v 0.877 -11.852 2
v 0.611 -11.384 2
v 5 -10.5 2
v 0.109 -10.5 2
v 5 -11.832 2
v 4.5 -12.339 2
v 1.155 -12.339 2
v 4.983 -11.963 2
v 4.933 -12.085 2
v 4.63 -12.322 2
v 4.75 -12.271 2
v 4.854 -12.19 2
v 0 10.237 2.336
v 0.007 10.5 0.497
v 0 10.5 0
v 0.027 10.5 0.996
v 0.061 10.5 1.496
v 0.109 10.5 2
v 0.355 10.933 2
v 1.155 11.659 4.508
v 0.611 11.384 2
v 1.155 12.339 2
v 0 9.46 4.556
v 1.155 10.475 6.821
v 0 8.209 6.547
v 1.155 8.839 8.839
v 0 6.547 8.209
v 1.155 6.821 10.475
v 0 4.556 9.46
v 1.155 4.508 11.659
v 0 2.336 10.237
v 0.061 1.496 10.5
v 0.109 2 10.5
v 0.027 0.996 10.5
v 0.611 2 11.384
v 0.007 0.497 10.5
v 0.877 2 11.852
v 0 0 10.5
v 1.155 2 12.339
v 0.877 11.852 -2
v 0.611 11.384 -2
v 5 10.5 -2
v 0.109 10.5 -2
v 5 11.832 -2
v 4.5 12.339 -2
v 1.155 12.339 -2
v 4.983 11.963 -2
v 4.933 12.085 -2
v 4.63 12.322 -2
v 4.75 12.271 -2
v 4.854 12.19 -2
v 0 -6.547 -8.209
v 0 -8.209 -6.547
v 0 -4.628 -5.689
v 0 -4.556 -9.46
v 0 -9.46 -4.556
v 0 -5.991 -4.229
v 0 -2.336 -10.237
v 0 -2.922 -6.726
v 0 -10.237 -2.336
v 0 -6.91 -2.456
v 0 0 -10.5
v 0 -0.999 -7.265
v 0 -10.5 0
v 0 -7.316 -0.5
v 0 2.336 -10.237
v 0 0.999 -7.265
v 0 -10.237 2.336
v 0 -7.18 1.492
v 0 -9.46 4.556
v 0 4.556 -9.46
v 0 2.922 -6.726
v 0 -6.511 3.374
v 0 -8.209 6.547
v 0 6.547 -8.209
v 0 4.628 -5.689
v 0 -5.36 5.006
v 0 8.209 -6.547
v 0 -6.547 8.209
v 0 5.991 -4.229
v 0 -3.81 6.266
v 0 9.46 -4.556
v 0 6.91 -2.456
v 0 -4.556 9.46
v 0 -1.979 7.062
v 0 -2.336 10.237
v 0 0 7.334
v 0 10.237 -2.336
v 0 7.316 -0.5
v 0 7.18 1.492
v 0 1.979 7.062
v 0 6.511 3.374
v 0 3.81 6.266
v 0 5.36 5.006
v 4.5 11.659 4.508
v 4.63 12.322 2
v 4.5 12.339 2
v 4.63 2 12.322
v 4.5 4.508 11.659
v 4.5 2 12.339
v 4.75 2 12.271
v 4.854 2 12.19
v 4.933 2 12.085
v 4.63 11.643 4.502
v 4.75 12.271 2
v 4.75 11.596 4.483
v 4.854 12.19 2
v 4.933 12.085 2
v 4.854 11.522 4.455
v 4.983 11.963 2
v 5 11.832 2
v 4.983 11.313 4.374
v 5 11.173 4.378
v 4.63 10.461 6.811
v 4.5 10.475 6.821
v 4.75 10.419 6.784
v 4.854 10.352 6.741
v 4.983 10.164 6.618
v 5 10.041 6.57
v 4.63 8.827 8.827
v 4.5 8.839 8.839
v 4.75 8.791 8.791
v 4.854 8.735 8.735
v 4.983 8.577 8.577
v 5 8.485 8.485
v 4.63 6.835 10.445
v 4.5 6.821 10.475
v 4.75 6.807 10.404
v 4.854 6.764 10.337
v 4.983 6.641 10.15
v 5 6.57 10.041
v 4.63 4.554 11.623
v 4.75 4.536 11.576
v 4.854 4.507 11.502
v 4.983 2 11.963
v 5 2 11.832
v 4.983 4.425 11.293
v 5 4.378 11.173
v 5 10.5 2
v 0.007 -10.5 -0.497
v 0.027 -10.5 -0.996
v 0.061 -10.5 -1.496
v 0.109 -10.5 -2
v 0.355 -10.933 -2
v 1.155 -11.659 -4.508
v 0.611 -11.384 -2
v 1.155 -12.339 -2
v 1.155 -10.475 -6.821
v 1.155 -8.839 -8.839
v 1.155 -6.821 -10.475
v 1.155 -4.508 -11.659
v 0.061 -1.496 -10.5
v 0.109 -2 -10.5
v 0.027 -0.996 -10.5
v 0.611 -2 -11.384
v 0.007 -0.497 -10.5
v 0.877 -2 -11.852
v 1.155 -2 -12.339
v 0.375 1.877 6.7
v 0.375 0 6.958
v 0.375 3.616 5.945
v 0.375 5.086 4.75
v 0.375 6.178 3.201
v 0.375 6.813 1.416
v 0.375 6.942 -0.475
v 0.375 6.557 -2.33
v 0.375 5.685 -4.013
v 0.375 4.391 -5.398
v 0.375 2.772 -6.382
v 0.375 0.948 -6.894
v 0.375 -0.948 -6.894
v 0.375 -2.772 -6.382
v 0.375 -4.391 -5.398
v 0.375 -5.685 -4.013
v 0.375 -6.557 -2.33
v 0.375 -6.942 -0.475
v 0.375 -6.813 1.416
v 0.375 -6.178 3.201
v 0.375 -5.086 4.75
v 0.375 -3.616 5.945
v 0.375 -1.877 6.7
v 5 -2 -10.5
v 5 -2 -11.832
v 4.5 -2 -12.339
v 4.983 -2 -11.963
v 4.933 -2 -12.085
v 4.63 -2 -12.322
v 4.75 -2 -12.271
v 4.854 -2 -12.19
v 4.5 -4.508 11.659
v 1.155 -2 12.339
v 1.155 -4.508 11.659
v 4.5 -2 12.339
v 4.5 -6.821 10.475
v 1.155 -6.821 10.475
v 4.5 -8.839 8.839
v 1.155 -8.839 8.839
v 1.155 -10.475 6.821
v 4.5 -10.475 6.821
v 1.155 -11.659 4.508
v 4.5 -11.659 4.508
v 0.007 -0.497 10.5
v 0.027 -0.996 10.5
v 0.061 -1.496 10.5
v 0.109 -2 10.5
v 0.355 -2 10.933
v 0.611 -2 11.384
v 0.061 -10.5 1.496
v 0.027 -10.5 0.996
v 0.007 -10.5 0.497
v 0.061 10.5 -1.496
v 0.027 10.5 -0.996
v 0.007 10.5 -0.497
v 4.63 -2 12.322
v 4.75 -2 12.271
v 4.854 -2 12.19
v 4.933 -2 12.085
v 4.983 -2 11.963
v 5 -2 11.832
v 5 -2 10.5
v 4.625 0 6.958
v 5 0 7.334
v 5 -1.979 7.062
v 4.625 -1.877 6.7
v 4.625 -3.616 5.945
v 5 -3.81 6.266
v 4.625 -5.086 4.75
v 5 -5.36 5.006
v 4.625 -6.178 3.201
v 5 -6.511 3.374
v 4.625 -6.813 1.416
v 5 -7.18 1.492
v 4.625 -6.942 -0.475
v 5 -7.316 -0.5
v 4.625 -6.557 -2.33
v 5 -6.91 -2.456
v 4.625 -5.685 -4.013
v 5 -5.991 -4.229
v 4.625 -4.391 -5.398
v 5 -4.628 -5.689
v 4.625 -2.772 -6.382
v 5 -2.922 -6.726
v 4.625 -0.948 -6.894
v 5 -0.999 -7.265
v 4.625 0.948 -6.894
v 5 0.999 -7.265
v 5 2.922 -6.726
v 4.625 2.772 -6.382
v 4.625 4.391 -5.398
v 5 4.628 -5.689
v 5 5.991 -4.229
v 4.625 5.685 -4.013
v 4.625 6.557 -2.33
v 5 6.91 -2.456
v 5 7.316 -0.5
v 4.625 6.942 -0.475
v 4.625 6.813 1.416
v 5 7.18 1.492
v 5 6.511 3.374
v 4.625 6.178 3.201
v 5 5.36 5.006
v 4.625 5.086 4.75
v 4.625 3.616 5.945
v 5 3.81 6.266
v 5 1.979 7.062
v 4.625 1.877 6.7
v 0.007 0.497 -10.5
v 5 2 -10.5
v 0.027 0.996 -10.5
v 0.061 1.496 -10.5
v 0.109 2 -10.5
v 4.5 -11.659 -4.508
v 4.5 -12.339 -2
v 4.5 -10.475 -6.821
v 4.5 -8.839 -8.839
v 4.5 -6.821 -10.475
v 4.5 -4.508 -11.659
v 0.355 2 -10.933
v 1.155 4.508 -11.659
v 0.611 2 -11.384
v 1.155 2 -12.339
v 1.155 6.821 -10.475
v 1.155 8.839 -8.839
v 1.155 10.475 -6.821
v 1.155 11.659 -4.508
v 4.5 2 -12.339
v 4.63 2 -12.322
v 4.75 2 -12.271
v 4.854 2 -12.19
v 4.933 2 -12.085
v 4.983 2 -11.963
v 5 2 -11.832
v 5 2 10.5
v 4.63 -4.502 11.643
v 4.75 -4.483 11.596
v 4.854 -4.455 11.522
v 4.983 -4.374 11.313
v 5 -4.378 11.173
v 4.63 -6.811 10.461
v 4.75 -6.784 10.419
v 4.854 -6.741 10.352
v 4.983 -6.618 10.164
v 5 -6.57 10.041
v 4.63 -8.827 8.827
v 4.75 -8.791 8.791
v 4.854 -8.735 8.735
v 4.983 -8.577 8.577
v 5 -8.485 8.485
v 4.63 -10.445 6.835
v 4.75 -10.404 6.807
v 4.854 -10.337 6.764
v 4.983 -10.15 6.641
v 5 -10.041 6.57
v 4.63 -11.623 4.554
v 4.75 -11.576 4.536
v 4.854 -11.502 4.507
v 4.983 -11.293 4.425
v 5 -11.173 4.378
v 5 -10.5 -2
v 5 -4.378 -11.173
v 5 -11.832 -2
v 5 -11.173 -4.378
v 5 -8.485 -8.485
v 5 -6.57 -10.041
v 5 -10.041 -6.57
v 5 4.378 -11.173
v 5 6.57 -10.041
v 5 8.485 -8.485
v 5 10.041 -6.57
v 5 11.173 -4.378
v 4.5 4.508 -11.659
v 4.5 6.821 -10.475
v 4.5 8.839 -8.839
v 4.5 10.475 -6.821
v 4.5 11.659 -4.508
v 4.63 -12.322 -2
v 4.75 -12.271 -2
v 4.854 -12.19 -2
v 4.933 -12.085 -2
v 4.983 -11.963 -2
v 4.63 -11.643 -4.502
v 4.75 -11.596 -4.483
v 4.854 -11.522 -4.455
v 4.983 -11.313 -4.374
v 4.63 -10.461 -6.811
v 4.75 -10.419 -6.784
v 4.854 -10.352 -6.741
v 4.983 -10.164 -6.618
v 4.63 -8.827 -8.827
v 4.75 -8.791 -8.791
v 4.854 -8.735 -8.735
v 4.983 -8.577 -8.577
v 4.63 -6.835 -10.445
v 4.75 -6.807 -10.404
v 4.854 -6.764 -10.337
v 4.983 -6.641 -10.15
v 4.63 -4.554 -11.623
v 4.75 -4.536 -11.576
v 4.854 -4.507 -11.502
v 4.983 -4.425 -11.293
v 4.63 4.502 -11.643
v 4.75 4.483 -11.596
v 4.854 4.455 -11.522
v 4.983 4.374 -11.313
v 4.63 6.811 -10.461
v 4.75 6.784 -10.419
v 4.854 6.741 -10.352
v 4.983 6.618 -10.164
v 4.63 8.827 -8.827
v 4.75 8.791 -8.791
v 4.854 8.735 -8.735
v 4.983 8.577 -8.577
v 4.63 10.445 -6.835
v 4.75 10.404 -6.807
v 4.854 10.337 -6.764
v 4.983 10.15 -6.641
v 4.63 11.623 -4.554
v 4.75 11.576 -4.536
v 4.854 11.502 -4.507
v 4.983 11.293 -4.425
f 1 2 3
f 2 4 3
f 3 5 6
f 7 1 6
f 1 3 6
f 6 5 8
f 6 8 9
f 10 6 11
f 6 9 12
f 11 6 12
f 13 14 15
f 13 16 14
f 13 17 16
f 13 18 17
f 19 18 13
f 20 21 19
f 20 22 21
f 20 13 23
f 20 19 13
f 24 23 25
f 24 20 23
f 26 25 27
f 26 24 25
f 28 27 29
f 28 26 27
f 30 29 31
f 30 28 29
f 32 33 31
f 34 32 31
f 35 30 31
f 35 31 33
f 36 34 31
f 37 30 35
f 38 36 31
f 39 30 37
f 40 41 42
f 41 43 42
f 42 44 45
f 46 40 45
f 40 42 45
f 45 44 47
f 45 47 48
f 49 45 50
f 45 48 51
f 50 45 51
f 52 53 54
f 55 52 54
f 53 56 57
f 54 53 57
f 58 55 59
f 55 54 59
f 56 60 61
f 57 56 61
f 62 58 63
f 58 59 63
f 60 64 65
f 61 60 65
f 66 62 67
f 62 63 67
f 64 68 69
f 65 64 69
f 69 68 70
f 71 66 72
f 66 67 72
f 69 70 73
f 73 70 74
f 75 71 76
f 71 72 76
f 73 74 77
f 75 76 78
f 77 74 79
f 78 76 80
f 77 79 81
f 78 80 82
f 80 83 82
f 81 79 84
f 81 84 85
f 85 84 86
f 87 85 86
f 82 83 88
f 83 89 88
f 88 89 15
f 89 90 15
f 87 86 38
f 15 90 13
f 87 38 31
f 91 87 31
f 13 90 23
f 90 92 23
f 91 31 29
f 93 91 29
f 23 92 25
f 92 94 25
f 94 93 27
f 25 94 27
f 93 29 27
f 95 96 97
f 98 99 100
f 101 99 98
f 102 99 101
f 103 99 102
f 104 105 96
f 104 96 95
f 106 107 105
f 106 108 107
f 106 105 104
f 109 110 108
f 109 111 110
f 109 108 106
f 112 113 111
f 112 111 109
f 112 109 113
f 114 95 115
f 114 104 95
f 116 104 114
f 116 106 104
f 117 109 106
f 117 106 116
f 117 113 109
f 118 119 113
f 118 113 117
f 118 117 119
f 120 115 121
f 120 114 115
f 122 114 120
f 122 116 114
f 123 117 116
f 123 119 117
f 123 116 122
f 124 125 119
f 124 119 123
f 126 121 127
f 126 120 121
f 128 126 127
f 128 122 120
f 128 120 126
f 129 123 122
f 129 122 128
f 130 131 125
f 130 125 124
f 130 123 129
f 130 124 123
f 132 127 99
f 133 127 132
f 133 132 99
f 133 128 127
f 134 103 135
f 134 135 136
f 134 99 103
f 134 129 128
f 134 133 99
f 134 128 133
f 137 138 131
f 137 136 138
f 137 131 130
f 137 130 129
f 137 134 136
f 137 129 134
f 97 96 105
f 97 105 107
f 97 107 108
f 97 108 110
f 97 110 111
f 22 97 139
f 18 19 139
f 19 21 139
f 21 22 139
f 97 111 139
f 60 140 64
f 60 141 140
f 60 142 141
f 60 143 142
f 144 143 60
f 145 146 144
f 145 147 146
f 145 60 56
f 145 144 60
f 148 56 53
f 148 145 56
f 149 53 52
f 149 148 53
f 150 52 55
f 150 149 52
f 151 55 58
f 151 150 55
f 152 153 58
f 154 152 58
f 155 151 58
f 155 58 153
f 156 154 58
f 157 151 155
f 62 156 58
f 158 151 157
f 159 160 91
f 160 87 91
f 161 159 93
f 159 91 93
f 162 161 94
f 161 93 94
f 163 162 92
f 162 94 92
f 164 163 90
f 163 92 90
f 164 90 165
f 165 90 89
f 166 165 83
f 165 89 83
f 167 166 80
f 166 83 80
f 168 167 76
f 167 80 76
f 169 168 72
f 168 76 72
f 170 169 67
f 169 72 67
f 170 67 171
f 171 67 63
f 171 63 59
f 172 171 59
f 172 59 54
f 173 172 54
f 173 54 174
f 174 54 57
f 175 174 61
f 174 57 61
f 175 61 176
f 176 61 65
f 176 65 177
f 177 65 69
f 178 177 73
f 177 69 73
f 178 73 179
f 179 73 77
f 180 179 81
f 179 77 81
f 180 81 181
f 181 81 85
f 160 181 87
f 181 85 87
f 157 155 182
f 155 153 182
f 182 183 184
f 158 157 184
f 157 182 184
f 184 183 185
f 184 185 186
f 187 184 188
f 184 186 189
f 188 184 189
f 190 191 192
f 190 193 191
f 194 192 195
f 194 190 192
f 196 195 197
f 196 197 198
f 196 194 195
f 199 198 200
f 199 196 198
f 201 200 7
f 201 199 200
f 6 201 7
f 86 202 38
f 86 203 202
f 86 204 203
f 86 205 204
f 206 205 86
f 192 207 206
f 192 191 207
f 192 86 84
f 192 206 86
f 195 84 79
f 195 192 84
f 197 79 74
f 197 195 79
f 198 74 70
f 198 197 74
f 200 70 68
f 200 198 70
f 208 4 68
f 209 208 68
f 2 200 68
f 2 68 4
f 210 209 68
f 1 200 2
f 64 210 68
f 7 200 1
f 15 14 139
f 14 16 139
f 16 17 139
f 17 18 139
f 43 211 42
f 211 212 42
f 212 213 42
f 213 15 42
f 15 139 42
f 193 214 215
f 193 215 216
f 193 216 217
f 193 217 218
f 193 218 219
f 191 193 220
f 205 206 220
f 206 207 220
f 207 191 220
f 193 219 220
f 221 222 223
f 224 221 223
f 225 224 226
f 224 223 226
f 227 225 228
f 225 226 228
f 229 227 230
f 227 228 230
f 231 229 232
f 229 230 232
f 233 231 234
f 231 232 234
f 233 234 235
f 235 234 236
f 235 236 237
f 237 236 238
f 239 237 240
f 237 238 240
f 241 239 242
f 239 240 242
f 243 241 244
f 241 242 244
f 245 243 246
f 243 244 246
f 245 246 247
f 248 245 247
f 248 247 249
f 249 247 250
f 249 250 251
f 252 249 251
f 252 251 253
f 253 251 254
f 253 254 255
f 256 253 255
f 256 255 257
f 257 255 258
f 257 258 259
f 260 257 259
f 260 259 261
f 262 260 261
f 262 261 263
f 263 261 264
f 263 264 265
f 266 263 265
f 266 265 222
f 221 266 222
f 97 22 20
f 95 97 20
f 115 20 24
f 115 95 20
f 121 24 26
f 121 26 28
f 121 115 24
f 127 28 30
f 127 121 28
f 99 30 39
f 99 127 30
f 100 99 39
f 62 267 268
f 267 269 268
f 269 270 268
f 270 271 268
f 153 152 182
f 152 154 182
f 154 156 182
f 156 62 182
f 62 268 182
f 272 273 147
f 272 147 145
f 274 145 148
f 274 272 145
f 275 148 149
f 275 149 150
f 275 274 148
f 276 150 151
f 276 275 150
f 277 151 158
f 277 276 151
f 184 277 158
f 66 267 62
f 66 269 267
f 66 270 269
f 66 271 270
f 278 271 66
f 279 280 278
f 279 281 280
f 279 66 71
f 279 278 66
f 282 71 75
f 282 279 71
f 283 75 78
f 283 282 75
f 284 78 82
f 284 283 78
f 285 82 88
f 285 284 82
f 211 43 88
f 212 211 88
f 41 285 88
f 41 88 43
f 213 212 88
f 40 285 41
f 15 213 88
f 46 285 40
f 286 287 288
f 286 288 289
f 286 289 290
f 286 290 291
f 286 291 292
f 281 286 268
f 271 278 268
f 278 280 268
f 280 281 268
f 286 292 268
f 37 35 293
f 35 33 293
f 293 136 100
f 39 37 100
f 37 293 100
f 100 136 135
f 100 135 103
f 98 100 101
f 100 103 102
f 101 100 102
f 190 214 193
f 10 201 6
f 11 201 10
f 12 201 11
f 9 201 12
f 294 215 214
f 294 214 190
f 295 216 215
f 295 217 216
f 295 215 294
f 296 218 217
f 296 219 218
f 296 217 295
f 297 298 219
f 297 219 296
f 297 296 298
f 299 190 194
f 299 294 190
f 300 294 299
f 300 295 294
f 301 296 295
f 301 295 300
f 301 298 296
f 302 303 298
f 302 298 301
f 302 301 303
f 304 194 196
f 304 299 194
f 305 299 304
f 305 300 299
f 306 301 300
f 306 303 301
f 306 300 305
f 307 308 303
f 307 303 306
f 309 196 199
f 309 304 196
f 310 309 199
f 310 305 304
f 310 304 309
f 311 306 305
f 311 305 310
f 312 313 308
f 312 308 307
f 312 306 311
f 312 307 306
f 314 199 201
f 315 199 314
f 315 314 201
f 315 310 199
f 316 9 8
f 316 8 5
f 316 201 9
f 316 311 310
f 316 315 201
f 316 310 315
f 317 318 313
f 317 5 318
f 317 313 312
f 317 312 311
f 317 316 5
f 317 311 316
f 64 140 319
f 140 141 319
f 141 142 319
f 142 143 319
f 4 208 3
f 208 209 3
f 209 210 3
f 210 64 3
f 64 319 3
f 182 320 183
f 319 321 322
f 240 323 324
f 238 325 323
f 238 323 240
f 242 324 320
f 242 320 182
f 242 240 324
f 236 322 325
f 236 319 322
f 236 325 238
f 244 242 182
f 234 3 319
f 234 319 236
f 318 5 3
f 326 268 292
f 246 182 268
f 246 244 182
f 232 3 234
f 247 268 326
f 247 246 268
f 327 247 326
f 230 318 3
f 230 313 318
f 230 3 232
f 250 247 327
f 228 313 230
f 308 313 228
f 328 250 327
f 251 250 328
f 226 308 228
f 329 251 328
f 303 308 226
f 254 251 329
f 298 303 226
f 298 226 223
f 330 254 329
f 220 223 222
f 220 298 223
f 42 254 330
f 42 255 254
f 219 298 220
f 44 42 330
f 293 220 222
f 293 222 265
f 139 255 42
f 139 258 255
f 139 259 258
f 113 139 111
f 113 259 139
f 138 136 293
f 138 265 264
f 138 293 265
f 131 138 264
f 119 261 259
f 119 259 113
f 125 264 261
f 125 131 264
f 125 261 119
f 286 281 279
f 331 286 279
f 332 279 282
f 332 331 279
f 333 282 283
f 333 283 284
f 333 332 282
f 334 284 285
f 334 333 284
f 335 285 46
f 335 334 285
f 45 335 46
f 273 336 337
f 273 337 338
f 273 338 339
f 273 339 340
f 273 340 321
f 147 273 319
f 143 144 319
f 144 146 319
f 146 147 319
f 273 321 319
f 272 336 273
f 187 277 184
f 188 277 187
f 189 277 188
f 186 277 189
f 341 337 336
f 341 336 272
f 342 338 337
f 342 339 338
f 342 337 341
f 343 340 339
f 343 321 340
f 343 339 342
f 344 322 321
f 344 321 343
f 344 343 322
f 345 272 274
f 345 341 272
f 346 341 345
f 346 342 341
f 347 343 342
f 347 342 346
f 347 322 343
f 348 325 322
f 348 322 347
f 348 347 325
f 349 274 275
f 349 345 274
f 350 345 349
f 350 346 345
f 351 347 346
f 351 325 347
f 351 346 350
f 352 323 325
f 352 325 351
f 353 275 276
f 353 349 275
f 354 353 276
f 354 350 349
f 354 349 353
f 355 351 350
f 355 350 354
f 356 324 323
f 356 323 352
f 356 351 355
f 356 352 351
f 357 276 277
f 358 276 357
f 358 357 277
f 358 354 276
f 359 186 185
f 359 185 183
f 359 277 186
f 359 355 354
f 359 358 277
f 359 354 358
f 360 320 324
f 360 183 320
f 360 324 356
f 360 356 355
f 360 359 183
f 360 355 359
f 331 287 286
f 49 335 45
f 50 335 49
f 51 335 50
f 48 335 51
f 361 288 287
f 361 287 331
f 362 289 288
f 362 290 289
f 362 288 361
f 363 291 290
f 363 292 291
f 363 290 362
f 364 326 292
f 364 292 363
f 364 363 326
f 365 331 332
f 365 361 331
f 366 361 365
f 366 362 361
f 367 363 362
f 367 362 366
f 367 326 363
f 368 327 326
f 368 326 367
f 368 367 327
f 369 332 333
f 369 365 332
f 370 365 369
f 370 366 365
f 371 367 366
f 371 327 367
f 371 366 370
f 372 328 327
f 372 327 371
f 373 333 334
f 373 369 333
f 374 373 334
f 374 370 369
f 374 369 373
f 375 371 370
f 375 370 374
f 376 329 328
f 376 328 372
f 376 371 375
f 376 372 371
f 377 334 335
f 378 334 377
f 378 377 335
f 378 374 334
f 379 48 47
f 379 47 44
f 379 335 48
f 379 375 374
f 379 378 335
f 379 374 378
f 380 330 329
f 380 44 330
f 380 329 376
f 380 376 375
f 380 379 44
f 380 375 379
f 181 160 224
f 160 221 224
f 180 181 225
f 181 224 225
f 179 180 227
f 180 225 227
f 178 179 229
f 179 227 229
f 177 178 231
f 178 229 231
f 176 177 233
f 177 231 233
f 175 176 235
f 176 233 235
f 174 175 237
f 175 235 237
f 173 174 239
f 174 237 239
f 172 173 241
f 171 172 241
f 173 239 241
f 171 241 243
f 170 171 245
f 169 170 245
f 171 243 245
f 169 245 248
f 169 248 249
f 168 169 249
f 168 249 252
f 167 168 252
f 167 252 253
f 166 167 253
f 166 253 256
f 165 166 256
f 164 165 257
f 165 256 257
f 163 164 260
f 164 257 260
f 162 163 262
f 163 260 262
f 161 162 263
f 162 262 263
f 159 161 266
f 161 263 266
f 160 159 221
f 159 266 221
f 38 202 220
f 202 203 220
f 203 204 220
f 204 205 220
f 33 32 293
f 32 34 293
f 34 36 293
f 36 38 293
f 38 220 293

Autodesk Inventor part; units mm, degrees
ref_plane "YZ Plane" through (0, 0, 0) normal (1, 0, 0) x (0, 1, 0)
ref_plane "XZ Plane" through (0, 0, 0) normal (0, 1, 0) x (-1, 0, 0)
sketch "Sketch1" plane through (0, 0, 0) normal (0, 0, 1) x (1, 0, 0)
  line L0 (0, 0) -> (5, 0)
  line L1 (0, 0) -> (0, 12.5)
  line L2 (0, 12.5) -> (5, 12.5)
  line L3 (5, 12.5) -> (5, 0)
  line L4 (0, 15) -> (0, -2.5) projected
  line L5 (-1, 0) -> (6, 0) projected
  dimension "d1" = 25
  dimension "d2" = 5
revolve "Body" add sketch "Sketch1" angle 360 about axis through (0, 0, 0) along (1, 0, 0)
sketch "Sketch2" plane through (0, 0, 0) normal (-1, 0, 0) x (0, 0, 1)
  circle A0 centre (0, 0) radius 12.5 projected
  point P0 (0, 0)
hole "Thread" at (0, 0, 0) direction (1, 0, 0) diameter 13.917 end through all thread size "M15x1" class "6H" standard "ISO Metric profile"
chamfer "Chamfer1" distance 2 angle 30 1 edges at (0, -12.5, 0) measured on face at (0, 10.5148, -1.2767)
sketch "Sketch3" plane through (5, 0, 0) normal (1, 0, 0) x (0, 0, -1)
  circle A0 centre (0, 0) radius 12.5 projected
  line L0 (-2, 12.339) -> (-2, 10.5)
  line L1 (-2, 10.5) -> (2, 10.5)
  line L2 (2, 10.5) -> (2, 12.339)
  line L3 (0, -17.5) -> (0, 17.5) projected
  line L4 (-17.5, 0) -> (17.5, 0) projected
  dimension "d12" = 2
  dimension "d13" = 2
  dimension "d14" = 10.5
extrude "Groove1" cut sketch "Sketch3" against normal through all contours L2 L1 L3 A0 | L3 L1 L0 A0
pattern_circular "Grooves1" count 4 over 360 about axis through (-10, 0, 0) along (1, 0, 0) of "Groove1"
fillet "Fillet1" radius 0.5 4 edges at (5, 8.8388, 8.8388) (5, 8.8388, -8.8388) (5, -8.8388, -8.8388) (5, -8.8388, 8.8388)
chamfer "Chamfer2" distance 0.375 angle 45 1 edges at (5, 0, -6.9585) measured on face at (5, -8.7255, -5.3872)
chamfer "Chamfer3" distance 0.375 angle 45 1 edges at (0, 0, -6.9585) measured on face at (0, 0.7788, -9.2317)
ref_plane "Work Plane1" through (35.7071, 0, 0) normal (0, 1, 0) x (-1, 0, 0)
equation "\"d1\" = SD2"
equation "\"d2\" = KOH"
equation "\"d12\" = 0.5 * SNB"
equation "\"d13\" = 0.5 * SNB"
equation "\"d14\" = 0.5 * SD2 - SNT"
equation "\"d10\" = -0.5 * LADI + 0.5 * SD2"
equation "\"d11\" = FAWI2"
equation "\"d40\" = -0.5 * LADI + 0.5 * SD2"
equation "\"d18\" = RR"
equation "\"d19\" = 0.025 * NND"
equation "\"d41\" = 0.025 * NND"
equation "\"d21\" = 0.025 * NND"
equation "\"d42\" = 0.025 * NND"
equation "\"NND\" = 15"
equation "\"KOH\" = 5"
equation "\"SD2\" = 25"
equation "\"SNB\" = 4"
equation "\"SNT\" = 2"
equation "\"LADI\" = 21"
equation "\"RR\" = 0.1 * KOH"
equation "\"FAWI2\" = 30deg"
equation "\"THREADDIA\" = 15"
properties part number "KM 02" material "Steel, Mild"
